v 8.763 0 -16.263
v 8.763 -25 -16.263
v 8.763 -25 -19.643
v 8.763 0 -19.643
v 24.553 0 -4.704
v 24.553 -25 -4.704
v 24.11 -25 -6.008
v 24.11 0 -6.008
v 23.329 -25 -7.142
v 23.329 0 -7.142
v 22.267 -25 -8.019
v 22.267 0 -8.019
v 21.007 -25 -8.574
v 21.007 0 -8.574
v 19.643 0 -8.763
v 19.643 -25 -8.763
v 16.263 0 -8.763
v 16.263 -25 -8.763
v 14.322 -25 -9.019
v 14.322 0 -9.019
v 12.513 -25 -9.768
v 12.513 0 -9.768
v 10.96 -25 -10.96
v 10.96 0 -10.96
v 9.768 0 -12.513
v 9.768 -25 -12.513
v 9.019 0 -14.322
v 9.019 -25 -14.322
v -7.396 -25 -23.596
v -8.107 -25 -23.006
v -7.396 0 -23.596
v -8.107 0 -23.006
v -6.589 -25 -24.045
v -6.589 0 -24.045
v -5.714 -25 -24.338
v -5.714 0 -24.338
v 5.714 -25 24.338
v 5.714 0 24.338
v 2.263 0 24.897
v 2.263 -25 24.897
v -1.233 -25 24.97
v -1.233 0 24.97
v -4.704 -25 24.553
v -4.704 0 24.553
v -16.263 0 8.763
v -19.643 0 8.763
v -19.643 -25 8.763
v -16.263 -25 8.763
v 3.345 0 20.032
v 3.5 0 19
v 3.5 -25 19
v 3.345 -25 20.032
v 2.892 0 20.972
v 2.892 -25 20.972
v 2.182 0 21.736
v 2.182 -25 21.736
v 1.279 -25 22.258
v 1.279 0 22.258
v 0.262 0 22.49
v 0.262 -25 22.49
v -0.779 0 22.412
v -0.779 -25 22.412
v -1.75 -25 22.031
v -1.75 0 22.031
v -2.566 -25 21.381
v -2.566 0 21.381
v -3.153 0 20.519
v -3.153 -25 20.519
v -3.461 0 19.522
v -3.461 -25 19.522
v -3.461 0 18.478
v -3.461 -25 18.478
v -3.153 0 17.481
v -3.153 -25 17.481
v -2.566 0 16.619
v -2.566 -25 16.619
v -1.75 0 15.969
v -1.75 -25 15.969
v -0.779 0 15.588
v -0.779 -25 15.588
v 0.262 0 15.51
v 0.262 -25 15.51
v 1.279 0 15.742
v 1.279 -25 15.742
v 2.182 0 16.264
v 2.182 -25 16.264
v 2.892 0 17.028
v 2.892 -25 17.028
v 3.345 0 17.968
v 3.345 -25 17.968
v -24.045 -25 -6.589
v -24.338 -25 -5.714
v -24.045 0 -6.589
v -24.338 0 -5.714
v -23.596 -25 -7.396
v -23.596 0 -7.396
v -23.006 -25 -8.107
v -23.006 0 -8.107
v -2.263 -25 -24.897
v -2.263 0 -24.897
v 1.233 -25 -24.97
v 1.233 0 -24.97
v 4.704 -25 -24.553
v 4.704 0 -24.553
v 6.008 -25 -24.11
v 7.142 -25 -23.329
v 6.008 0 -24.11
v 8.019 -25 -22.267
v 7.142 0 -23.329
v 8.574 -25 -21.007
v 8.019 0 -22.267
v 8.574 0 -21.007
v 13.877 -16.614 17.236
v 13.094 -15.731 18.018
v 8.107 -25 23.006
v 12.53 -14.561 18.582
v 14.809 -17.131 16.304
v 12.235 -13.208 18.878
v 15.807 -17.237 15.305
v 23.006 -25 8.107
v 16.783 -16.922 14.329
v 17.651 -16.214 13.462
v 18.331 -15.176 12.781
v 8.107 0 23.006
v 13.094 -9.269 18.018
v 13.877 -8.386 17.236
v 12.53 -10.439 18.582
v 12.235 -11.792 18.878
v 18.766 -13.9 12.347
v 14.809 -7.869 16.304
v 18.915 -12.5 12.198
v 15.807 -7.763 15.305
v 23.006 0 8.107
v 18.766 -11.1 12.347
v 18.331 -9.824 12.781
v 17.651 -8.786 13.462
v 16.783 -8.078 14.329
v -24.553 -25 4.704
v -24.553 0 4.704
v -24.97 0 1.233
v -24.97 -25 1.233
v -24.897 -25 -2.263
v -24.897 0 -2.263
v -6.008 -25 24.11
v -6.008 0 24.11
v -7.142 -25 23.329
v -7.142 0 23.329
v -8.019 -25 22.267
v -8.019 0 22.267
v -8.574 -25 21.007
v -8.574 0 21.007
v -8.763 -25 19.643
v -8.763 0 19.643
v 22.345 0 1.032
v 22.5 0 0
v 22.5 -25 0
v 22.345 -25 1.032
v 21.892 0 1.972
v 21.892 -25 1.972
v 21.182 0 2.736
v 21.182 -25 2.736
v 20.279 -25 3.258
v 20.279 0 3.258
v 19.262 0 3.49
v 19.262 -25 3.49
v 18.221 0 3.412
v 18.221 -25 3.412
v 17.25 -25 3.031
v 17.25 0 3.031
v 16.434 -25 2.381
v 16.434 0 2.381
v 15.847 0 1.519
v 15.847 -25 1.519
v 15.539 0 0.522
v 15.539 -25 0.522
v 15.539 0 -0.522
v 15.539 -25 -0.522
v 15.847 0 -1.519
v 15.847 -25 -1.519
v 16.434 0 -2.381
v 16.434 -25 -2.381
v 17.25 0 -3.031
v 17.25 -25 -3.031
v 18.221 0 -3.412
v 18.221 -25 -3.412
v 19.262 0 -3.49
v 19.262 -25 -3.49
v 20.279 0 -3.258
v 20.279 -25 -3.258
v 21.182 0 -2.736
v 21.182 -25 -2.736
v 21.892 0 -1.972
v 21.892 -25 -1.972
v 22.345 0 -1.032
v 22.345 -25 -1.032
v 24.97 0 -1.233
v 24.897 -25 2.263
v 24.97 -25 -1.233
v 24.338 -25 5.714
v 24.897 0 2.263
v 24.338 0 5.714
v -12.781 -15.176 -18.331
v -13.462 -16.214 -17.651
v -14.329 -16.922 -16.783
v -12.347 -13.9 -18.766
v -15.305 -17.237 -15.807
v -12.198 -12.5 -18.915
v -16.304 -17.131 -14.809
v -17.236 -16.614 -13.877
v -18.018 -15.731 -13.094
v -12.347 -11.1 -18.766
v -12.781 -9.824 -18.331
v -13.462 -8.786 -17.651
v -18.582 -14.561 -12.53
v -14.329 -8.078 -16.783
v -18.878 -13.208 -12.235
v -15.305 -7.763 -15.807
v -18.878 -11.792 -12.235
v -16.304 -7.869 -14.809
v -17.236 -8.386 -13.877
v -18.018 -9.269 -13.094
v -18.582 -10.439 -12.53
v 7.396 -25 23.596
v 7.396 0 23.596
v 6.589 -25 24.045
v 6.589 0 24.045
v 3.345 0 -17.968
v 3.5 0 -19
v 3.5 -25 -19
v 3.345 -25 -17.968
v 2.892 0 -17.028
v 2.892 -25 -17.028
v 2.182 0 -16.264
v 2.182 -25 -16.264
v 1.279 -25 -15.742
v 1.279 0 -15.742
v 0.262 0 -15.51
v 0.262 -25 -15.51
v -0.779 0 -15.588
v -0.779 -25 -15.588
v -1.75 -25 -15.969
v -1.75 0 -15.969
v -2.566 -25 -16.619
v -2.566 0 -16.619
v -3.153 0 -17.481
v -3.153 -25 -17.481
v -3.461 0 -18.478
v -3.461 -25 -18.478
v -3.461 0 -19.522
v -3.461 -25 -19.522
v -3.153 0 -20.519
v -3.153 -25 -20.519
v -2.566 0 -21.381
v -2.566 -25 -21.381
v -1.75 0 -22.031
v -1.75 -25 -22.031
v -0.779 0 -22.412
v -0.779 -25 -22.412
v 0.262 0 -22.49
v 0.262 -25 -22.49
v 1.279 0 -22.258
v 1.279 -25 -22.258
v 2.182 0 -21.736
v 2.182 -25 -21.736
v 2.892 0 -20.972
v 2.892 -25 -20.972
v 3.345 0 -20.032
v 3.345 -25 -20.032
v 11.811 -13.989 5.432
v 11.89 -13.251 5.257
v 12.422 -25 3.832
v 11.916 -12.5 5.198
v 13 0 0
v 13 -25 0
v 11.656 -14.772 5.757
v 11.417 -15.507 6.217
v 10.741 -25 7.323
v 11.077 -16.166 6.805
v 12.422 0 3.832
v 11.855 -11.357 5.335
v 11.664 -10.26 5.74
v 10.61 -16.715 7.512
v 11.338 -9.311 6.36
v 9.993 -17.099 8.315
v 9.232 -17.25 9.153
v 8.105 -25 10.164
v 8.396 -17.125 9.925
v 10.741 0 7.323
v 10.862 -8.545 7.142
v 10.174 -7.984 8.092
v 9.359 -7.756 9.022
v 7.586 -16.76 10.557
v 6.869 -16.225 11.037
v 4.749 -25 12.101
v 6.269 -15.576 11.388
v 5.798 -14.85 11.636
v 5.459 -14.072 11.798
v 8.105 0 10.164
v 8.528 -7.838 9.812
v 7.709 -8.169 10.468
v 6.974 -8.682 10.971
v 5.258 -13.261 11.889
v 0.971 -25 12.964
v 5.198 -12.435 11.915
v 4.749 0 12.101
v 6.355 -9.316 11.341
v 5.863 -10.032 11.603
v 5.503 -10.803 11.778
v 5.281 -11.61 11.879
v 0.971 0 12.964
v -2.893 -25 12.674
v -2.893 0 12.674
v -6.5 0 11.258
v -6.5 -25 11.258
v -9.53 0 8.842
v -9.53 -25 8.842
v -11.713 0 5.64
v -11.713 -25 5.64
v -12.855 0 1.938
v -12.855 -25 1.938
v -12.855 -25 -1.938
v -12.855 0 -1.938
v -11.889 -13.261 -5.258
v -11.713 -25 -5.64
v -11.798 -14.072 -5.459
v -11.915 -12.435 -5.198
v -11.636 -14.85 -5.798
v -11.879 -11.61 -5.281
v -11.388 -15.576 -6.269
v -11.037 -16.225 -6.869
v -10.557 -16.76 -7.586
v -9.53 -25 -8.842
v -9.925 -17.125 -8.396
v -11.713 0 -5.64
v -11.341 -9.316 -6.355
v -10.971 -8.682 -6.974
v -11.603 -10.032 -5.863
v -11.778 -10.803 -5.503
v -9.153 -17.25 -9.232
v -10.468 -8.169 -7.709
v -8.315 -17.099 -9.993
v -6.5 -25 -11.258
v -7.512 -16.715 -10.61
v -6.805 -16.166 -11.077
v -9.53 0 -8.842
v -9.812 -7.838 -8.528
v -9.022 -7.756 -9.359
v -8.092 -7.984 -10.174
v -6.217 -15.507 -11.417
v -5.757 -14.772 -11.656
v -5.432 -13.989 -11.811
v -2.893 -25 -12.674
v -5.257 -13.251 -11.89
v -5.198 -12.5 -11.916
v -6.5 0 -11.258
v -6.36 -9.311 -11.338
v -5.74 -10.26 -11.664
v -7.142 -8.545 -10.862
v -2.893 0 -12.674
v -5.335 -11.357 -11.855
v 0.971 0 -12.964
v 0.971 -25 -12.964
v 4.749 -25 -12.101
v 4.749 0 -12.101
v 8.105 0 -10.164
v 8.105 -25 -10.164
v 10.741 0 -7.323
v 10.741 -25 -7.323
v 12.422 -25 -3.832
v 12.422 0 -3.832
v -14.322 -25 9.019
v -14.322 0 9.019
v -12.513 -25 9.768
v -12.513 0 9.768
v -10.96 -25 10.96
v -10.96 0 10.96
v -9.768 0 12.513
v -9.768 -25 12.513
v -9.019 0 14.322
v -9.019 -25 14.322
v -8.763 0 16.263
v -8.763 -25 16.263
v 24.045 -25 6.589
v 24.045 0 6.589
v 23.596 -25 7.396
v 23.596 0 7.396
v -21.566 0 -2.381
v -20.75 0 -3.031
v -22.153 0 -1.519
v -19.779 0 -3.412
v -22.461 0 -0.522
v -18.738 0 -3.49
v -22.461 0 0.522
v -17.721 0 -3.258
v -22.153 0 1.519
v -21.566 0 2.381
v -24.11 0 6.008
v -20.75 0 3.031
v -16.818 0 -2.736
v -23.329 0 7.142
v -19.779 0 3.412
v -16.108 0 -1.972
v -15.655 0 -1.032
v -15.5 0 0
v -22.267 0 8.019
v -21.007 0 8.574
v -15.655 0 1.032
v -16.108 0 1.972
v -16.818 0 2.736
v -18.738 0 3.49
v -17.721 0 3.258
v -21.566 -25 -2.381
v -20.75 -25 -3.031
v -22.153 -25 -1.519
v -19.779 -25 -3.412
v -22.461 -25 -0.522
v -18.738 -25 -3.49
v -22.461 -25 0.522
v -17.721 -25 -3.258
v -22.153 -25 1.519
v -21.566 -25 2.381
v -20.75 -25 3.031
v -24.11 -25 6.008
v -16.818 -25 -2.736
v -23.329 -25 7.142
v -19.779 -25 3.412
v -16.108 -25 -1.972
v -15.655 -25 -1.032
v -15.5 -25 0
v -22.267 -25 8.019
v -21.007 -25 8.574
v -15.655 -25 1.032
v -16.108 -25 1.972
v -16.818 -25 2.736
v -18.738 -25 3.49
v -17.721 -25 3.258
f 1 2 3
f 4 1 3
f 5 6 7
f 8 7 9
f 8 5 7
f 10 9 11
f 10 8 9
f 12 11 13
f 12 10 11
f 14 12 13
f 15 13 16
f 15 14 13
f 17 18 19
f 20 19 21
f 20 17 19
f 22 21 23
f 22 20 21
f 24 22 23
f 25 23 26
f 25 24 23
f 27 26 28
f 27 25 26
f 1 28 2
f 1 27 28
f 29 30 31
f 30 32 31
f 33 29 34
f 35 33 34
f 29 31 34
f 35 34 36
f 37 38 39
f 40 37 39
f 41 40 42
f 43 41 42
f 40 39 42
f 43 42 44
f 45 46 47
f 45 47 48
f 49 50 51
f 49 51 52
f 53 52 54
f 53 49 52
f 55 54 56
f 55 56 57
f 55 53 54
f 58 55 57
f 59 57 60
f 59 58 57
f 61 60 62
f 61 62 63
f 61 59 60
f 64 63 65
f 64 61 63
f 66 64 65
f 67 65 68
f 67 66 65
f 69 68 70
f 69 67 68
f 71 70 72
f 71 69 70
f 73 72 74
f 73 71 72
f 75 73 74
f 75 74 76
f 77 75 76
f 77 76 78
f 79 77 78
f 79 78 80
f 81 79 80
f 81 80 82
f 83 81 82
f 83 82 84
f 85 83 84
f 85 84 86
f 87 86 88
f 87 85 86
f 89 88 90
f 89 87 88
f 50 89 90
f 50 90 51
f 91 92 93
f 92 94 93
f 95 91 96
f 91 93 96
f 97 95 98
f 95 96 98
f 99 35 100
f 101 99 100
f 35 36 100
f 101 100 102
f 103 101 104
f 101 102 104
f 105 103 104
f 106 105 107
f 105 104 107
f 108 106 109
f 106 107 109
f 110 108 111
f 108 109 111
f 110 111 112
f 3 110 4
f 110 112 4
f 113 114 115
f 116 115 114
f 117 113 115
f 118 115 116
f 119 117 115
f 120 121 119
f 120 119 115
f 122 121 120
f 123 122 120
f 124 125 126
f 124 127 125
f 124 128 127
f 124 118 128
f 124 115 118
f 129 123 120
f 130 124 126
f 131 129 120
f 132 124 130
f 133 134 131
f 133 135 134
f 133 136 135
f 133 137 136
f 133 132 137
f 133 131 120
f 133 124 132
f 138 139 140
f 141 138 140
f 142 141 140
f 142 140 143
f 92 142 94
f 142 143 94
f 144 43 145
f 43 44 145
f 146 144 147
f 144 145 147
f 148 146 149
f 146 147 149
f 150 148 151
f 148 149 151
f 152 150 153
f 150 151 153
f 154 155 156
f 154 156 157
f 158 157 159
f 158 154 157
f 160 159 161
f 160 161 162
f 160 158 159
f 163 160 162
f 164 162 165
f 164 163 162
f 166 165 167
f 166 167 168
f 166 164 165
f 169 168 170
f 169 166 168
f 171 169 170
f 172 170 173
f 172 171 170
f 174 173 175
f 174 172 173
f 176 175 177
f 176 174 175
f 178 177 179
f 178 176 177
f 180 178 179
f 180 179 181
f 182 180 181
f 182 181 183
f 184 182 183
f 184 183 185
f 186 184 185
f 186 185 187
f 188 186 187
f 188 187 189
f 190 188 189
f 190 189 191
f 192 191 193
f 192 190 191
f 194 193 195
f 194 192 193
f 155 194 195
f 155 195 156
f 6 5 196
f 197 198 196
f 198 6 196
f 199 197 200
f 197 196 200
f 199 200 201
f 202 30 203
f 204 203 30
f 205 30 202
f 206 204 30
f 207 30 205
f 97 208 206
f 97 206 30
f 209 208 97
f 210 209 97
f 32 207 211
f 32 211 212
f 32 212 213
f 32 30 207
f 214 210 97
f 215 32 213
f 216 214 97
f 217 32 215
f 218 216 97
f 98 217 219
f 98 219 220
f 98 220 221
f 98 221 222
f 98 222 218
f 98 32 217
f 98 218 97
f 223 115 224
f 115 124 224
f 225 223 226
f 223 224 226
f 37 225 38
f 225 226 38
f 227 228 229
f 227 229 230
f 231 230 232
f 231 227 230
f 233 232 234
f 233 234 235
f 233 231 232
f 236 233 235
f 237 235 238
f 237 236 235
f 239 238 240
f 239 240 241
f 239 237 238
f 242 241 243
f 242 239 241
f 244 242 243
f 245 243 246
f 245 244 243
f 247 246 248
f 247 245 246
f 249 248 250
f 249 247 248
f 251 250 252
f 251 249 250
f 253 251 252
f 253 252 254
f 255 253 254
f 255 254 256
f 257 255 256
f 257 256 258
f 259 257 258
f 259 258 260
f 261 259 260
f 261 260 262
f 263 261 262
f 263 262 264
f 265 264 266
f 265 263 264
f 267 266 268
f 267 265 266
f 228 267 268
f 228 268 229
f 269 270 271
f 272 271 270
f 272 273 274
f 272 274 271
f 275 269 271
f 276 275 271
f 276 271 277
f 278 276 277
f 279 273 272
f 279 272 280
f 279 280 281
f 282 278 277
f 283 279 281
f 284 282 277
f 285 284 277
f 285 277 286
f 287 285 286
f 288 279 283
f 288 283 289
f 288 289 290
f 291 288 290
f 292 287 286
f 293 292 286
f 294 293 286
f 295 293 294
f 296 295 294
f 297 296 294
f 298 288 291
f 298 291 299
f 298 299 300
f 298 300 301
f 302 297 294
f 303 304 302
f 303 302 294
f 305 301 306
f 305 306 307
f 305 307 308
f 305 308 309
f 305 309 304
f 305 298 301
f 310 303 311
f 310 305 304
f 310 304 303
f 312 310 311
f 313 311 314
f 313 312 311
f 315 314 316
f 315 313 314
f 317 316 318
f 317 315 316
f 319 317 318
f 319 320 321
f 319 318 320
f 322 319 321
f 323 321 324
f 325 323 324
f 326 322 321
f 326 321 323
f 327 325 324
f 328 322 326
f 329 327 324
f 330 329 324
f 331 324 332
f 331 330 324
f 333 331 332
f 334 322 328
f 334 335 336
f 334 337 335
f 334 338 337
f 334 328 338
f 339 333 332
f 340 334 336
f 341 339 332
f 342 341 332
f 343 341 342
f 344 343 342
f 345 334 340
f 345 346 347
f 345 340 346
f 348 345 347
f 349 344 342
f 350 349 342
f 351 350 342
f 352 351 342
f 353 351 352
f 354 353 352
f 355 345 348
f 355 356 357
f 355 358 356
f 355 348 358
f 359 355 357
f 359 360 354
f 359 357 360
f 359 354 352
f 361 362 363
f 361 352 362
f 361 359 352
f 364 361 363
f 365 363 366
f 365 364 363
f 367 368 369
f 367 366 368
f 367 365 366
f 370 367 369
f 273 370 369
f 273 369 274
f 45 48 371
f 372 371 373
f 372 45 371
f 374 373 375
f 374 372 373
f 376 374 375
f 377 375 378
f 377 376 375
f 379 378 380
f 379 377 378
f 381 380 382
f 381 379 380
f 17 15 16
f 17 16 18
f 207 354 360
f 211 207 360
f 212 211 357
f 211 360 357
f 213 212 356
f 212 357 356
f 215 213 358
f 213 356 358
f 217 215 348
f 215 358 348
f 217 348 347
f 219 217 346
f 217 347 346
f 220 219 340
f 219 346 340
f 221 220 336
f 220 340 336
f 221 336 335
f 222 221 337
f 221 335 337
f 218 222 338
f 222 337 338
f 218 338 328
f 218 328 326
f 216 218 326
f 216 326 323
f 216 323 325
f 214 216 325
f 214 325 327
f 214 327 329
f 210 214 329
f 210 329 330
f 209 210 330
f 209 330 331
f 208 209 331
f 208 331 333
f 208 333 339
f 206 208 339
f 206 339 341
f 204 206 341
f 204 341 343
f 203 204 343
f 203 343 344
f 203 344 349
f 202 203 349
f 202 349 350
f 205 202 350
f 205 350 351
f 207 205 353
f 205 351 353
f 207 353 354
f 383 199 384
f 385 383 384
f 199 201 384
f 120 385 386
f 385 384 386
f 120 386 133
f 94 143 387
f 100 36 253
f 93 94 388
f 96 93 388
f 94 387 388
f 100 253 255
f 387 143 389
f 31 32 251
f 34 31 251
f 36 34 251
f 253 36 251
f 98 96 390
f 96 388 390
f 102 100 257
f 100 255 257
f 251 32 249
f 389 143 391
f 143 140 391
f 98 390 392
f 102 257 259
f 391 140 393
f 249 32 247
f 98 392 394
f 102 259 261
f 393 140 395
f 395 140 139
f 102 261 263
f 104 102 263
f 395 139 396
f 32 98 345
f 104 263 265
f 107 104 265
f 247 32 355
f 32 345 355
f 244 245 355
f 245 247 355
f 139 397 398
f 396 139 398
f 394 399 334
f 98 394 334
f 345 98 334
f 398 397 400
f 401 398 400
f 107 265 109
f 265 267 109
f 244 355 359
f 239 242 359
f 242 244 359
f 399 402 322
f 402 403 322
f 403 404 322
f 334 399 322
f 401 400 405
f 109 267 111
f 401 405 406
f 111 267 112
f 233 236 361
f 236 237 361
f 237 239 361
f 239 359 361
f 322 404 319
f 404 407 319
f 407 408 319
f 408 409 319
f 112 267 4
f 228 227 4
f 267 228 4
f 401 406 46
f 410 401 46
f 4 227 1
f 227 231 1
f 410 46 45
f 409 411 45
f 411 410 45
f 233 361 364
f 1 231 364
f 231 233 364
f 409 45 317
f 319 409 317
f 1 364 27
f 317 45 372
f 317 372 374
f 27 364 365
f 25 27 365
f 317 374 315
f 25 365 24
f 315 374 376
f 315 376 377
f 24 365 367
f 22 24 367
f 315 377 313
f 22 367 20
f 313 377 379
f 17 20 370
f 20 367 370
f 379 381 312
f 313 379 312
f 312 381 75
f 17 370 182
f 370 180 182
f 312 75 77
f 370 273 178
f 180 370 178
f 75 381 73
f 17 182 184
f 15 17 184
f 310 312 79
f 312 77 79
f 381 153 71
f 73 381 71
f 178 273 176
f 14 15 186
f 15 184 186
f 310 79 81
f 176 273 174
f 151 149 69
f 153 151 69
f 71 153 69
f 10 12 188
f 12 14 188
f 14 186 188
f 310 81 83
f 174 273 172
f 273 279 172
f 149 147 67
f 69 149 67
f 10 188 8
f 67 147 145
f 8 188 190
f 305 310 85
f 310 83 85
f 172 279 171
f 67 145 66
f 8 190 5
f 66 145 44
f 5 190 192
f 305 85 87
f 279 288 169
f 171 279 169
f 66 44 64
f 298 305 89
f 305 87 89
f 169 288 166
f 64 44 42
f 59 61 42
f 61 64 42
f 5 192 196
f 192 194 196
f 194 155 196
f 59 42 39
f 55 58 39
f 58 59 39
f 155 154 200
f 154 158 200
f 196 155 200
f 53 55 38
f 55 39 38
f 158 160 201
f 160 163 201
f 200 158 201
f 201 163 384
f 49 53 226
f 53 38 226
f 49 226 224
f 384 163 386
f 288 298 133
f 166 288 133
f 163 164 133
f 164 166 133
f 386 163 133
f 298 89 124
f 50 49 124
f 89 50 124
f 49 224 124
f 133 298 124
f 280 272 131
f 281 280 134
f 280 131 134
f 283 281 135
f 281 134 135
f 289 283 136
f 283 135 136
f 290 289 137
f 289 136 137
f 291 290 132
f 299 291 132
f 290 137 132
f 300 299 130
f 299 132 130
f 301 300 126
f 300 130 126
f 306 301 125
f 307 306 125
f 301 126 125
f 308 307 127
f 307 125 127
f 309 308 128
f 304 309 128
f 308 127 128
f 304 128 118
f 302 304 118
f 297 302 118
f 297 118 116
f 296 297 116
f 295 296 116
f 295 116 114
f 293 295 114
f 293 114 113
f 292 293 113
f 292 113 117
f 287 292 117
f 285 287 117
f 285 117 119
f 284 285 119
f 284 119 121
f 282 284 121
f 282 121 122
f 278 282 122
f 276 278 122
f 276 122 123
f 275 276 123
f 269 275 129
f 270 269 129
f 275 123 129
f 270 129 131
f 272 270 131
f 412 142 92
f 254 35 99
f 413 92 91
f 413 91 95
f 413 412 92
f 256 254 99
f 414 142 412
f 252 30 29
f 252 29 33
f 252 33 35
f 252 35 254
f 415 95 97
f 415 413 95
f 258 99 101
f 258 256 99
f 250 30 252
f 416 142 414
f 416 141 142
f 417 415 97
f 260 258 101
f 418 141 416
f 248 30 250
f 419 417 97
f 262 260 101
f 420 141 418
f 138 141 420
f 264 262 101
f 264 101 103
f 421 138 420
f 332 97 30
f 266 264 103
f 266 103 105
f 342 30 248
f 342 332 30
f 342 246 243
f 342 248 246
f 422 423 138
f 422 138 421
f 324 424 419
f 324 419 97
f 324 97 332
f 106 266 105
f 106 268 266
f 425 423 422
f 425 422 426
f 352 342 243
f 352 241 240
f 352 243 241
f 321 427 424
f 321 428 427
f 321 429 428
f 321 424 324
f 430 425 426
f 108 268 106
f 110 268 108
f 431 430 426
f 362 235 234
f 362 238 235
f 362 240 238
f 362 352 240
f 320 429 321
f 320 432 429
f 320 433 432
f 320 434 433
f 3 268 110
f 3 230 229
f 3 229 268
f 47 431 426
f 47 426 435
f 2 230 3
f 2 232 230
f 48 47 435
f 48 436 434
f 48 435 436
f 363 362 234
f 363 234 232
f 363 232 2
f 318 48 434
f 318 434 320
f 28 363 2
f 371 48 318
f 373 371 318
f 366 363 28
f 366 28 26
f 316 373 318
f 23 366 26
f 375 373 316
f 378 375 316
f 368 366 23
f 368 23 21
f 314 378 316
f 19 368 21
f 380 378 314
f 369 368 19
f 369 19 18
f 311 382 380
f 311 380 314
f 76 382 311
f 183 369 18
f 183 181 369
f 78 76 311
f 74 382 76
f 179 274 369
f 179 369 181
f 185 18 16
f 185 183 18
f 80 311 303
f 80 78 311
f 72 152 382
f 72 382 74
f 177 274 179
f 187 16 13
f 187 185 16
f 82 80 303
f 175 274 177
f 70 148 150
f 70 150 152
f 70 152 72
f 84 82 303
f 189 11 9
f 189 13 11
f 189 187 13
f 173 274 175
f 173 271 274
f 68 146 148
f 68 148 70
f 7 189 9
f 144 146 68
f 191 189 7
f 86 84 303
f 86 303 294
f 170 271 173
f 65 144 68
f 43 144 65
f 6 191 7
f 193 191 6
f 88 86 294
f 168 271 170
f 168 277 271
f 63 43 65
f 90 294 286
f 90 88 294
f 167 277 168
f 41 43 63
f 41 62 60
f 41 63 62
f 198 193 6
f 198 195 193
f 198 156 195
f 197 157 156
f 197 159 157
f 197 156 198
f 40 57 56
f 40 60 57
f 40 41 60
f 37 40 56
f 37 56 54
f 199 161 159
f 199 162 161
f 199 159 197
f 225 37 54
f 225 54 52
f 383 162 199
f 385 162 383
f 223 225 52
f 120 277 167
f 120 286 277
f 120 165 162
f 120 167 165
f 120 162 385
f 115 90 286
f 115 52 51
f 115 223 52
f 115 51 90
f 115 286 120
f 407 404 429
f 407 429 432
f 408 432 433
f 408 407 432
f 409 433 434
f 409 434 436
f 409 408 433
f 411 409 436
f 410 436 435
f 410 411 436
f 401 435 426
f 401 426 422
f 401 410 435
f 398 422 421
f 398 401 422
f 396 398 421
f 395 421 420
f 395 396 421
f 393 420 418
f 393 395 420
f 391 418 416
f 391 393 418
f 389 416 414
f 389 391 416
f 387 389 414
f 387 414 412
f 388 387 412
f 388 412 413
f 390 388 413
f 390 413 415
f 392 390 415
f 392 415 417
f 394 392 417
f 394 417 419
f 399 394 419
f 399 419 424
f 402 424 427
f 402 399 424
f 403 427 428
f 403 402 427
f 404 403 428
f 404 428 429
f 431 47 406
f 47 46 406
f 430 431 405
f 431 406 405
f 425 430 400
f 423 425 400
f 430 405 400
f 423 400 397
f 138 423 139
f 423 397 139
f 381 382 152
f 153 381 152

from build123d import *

# Parameters (mm, degrees)
F0_R     = 25
F0_R_2   = 3.5
F1_DEPTH = 25
F3_DEPTH = 25.001
F4_R     = 5
F5_R     = 13
F6_DEPTH = 25.001
F7_R     = 4.75
F8_DEPTH = 57.3563390593


with BuildPart() as f1:
    # F0 (on Front) → F1 (new body)
    with BuildSketch(Plane.XZ):
        Circle(F0_R)
        with Locations((0, -19)):
            Circle(F0_R_2, mode=Mode.SUBTRACT)
        with Locations((-19, 0)):
            Circle(F0_R_2, mode=Mode.SUBTRACT)
        with Locations((19, 0)):
            Circle(F0_R_2, mode=Mode.SUBTRACT)
        with Locations((0, 19)):
            Circle(F0_R_2, mode=Mode.SUBTRACT)
    extrude(amount=F1_DEPTH)

    # F2 (on Front) → F3 (cut, through all)
    with BuildSketch(Plane.XZ):
        with BuildLine():
            Line((-23.7634559673, 8.7634559673), (-16.2634559673, 8.7634559673))
            ThreePointArc((-16.2634559673, 8.7634559673), (-10.9601551084, 10.9601551084), (-8.7634559673, 16.2634559673))
            Line((-8.7634559673, 16.2634559673), (-8.7634559673, 23.7634559673))
            Line((-8.7634559673, 23.7634559673), (-23.7634559673, 23.7634559673))
            Line((-23.7634559673, 23.7634559673), (-23.7634559673, 8.7634559673))
        make_face()
        Polygon((1.4142135624, 29.6984848098), (29.6984848098, 1.4142135624), (61.3951798296, 33.6381491506), (33.3745288664, 61.6588001138), align=None)
        Polygon((-1.4142135624, -29.6984848098), (-29.6984848098, -1.4142135624), (-61.6588001138, -33.3745288664), (-33.6381491506, -61.3951798296), align=None)
        with BuildLine():
            ThreePointArc((16.2634559673, -8.7634559673), (10.9601551084, -10.9601551084), (8.7634559673, -16.2634559673))
            Line((8.7634559673, -16.2634559673), (8.7634559673, -23.7634559673))
            Line((8.7634559673, -23.7634559673), (23.7634559673, -23.7634559673))
            Line((23.7634559673, -23.7634559673), (23.7634559673, -8.7634559673))
            Line((23.7634559673, -8.7634559673), (16.2634559673, -8.7634559673))
        make_face()
    extrude(amount=F3_DEPTH, mode=Mode.SUBTRACT)

    # F4
    f4_edges = [f1.edges().sort_by_distance(p)[0] for p in [
        (-8.763456, -12.5, 23.413711),
        (-23.413711, -12.5, 8.763456),
        (8.763456, -12.5, -23.413711),
        (23.413711, -12.5, -8.763456),
        (23.952777, -12.5, 7.159921),
        (7.159921, -12.5, 23.952777),
        (-23.952777, -12.5, -7.159921),
        (-7.159921, -12.5, -23.952777),
    ]]
    fillet(f4_edges, radius=F4_R)

    # F5 (on Front) → F6 (cut, through all)
    with BuildSketch(Plane.XZ):
        Circle(F5_R)
    extrude(amount=F6_DEPTH, mode=Mode.SUBTRACT)

    # F7 (on face) → F8 (cut, through all)
    with BuildSketch(Plane(origin=(15.5563491861, 0, 15.5563491861), x_dir=(0.7071067812, 0, -0.7071067812), z_dir=(0.7071067812, 0, 0.7071067812))):
        with Locations((0, -12.5)):
            Circle(F7_R)
    extrude(amount=-F8_DEPTH, mode=Mode.SUBTRACT)


solid = f1.part
